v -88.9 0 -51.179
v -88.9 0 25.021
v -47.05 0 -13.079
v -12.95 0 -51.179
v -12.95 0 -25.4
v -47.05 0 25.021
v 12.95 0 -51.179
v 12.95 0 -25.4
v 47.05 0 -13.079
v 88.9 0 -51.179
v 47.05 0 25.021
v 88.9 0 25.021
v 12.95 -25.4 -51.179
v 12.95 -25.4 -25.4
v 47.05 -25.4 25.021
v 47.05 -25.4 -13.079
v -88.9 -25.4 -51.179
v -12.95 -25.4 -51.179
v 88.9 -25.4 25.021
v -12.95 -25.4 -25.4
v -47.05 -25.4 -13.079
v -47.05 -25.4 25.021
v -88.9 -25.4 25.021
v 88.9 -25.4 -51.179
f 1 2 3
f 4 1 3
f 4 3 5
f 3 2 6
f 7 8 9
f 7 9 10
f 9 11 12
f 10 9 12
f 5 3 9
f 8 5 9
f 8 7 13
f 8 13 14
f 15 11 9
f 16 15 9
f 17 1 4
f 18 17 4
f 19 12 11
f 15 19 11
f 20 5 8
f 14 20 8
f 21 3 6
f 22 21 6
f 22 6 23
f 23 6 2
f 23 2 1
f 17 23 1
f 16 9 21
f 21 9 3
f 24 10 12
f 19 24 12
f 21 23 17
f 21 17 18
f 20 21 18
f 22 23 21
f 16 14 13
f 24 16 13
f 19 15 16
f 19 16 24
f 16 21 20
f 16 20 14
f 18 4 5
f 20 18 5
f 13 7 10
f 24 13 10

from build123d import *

# Parameters (mm, degrees)
F1_DEPTH = 25.4
F2_W     = 25.9
F2_H     = 25.778546
F3_DEPTH = 4
F4_DEPTH = 25.401


with BuildPart() as f1:
    # F0 (on Front) → F1 (new body)
    with BuildSketch(Plane.XZ):
        Polygon((-47.05, 25.021454), (-88.9, 25.021454), (-88.9, -30.673691), (-88.9, -51.178546), (-41.565981, -51.178546), (0, -51.178546), (88.9, -51.178546), (88.9, 25.021454), (47.05, 25.021454), (47.05, -13.078546), (0, -13.078546), (-47.05, -13.078546), align=None)
    extrude(amount=F1_DEPTH)

    # F2 (on Front) → F3 (cut)
    with BuildSketch(Plane.XZ):
        with Locations((0, -38.289273)):
            Rectangle(F2_W, F2_H)
    extrude(amount=F3_DEPTH, mode=Mode.SUBTRACT)

    # F2 (on Front) → F4 (cut, through all)
    with BuildSketch(Plane.XZ):
        with Locations((0, -38.289273)):
            Rectangle(F2_W, F2_H)
    extrude(amount=F4_DEPTH, mode=Mode.SUBTRACT)


solid = f1.part
